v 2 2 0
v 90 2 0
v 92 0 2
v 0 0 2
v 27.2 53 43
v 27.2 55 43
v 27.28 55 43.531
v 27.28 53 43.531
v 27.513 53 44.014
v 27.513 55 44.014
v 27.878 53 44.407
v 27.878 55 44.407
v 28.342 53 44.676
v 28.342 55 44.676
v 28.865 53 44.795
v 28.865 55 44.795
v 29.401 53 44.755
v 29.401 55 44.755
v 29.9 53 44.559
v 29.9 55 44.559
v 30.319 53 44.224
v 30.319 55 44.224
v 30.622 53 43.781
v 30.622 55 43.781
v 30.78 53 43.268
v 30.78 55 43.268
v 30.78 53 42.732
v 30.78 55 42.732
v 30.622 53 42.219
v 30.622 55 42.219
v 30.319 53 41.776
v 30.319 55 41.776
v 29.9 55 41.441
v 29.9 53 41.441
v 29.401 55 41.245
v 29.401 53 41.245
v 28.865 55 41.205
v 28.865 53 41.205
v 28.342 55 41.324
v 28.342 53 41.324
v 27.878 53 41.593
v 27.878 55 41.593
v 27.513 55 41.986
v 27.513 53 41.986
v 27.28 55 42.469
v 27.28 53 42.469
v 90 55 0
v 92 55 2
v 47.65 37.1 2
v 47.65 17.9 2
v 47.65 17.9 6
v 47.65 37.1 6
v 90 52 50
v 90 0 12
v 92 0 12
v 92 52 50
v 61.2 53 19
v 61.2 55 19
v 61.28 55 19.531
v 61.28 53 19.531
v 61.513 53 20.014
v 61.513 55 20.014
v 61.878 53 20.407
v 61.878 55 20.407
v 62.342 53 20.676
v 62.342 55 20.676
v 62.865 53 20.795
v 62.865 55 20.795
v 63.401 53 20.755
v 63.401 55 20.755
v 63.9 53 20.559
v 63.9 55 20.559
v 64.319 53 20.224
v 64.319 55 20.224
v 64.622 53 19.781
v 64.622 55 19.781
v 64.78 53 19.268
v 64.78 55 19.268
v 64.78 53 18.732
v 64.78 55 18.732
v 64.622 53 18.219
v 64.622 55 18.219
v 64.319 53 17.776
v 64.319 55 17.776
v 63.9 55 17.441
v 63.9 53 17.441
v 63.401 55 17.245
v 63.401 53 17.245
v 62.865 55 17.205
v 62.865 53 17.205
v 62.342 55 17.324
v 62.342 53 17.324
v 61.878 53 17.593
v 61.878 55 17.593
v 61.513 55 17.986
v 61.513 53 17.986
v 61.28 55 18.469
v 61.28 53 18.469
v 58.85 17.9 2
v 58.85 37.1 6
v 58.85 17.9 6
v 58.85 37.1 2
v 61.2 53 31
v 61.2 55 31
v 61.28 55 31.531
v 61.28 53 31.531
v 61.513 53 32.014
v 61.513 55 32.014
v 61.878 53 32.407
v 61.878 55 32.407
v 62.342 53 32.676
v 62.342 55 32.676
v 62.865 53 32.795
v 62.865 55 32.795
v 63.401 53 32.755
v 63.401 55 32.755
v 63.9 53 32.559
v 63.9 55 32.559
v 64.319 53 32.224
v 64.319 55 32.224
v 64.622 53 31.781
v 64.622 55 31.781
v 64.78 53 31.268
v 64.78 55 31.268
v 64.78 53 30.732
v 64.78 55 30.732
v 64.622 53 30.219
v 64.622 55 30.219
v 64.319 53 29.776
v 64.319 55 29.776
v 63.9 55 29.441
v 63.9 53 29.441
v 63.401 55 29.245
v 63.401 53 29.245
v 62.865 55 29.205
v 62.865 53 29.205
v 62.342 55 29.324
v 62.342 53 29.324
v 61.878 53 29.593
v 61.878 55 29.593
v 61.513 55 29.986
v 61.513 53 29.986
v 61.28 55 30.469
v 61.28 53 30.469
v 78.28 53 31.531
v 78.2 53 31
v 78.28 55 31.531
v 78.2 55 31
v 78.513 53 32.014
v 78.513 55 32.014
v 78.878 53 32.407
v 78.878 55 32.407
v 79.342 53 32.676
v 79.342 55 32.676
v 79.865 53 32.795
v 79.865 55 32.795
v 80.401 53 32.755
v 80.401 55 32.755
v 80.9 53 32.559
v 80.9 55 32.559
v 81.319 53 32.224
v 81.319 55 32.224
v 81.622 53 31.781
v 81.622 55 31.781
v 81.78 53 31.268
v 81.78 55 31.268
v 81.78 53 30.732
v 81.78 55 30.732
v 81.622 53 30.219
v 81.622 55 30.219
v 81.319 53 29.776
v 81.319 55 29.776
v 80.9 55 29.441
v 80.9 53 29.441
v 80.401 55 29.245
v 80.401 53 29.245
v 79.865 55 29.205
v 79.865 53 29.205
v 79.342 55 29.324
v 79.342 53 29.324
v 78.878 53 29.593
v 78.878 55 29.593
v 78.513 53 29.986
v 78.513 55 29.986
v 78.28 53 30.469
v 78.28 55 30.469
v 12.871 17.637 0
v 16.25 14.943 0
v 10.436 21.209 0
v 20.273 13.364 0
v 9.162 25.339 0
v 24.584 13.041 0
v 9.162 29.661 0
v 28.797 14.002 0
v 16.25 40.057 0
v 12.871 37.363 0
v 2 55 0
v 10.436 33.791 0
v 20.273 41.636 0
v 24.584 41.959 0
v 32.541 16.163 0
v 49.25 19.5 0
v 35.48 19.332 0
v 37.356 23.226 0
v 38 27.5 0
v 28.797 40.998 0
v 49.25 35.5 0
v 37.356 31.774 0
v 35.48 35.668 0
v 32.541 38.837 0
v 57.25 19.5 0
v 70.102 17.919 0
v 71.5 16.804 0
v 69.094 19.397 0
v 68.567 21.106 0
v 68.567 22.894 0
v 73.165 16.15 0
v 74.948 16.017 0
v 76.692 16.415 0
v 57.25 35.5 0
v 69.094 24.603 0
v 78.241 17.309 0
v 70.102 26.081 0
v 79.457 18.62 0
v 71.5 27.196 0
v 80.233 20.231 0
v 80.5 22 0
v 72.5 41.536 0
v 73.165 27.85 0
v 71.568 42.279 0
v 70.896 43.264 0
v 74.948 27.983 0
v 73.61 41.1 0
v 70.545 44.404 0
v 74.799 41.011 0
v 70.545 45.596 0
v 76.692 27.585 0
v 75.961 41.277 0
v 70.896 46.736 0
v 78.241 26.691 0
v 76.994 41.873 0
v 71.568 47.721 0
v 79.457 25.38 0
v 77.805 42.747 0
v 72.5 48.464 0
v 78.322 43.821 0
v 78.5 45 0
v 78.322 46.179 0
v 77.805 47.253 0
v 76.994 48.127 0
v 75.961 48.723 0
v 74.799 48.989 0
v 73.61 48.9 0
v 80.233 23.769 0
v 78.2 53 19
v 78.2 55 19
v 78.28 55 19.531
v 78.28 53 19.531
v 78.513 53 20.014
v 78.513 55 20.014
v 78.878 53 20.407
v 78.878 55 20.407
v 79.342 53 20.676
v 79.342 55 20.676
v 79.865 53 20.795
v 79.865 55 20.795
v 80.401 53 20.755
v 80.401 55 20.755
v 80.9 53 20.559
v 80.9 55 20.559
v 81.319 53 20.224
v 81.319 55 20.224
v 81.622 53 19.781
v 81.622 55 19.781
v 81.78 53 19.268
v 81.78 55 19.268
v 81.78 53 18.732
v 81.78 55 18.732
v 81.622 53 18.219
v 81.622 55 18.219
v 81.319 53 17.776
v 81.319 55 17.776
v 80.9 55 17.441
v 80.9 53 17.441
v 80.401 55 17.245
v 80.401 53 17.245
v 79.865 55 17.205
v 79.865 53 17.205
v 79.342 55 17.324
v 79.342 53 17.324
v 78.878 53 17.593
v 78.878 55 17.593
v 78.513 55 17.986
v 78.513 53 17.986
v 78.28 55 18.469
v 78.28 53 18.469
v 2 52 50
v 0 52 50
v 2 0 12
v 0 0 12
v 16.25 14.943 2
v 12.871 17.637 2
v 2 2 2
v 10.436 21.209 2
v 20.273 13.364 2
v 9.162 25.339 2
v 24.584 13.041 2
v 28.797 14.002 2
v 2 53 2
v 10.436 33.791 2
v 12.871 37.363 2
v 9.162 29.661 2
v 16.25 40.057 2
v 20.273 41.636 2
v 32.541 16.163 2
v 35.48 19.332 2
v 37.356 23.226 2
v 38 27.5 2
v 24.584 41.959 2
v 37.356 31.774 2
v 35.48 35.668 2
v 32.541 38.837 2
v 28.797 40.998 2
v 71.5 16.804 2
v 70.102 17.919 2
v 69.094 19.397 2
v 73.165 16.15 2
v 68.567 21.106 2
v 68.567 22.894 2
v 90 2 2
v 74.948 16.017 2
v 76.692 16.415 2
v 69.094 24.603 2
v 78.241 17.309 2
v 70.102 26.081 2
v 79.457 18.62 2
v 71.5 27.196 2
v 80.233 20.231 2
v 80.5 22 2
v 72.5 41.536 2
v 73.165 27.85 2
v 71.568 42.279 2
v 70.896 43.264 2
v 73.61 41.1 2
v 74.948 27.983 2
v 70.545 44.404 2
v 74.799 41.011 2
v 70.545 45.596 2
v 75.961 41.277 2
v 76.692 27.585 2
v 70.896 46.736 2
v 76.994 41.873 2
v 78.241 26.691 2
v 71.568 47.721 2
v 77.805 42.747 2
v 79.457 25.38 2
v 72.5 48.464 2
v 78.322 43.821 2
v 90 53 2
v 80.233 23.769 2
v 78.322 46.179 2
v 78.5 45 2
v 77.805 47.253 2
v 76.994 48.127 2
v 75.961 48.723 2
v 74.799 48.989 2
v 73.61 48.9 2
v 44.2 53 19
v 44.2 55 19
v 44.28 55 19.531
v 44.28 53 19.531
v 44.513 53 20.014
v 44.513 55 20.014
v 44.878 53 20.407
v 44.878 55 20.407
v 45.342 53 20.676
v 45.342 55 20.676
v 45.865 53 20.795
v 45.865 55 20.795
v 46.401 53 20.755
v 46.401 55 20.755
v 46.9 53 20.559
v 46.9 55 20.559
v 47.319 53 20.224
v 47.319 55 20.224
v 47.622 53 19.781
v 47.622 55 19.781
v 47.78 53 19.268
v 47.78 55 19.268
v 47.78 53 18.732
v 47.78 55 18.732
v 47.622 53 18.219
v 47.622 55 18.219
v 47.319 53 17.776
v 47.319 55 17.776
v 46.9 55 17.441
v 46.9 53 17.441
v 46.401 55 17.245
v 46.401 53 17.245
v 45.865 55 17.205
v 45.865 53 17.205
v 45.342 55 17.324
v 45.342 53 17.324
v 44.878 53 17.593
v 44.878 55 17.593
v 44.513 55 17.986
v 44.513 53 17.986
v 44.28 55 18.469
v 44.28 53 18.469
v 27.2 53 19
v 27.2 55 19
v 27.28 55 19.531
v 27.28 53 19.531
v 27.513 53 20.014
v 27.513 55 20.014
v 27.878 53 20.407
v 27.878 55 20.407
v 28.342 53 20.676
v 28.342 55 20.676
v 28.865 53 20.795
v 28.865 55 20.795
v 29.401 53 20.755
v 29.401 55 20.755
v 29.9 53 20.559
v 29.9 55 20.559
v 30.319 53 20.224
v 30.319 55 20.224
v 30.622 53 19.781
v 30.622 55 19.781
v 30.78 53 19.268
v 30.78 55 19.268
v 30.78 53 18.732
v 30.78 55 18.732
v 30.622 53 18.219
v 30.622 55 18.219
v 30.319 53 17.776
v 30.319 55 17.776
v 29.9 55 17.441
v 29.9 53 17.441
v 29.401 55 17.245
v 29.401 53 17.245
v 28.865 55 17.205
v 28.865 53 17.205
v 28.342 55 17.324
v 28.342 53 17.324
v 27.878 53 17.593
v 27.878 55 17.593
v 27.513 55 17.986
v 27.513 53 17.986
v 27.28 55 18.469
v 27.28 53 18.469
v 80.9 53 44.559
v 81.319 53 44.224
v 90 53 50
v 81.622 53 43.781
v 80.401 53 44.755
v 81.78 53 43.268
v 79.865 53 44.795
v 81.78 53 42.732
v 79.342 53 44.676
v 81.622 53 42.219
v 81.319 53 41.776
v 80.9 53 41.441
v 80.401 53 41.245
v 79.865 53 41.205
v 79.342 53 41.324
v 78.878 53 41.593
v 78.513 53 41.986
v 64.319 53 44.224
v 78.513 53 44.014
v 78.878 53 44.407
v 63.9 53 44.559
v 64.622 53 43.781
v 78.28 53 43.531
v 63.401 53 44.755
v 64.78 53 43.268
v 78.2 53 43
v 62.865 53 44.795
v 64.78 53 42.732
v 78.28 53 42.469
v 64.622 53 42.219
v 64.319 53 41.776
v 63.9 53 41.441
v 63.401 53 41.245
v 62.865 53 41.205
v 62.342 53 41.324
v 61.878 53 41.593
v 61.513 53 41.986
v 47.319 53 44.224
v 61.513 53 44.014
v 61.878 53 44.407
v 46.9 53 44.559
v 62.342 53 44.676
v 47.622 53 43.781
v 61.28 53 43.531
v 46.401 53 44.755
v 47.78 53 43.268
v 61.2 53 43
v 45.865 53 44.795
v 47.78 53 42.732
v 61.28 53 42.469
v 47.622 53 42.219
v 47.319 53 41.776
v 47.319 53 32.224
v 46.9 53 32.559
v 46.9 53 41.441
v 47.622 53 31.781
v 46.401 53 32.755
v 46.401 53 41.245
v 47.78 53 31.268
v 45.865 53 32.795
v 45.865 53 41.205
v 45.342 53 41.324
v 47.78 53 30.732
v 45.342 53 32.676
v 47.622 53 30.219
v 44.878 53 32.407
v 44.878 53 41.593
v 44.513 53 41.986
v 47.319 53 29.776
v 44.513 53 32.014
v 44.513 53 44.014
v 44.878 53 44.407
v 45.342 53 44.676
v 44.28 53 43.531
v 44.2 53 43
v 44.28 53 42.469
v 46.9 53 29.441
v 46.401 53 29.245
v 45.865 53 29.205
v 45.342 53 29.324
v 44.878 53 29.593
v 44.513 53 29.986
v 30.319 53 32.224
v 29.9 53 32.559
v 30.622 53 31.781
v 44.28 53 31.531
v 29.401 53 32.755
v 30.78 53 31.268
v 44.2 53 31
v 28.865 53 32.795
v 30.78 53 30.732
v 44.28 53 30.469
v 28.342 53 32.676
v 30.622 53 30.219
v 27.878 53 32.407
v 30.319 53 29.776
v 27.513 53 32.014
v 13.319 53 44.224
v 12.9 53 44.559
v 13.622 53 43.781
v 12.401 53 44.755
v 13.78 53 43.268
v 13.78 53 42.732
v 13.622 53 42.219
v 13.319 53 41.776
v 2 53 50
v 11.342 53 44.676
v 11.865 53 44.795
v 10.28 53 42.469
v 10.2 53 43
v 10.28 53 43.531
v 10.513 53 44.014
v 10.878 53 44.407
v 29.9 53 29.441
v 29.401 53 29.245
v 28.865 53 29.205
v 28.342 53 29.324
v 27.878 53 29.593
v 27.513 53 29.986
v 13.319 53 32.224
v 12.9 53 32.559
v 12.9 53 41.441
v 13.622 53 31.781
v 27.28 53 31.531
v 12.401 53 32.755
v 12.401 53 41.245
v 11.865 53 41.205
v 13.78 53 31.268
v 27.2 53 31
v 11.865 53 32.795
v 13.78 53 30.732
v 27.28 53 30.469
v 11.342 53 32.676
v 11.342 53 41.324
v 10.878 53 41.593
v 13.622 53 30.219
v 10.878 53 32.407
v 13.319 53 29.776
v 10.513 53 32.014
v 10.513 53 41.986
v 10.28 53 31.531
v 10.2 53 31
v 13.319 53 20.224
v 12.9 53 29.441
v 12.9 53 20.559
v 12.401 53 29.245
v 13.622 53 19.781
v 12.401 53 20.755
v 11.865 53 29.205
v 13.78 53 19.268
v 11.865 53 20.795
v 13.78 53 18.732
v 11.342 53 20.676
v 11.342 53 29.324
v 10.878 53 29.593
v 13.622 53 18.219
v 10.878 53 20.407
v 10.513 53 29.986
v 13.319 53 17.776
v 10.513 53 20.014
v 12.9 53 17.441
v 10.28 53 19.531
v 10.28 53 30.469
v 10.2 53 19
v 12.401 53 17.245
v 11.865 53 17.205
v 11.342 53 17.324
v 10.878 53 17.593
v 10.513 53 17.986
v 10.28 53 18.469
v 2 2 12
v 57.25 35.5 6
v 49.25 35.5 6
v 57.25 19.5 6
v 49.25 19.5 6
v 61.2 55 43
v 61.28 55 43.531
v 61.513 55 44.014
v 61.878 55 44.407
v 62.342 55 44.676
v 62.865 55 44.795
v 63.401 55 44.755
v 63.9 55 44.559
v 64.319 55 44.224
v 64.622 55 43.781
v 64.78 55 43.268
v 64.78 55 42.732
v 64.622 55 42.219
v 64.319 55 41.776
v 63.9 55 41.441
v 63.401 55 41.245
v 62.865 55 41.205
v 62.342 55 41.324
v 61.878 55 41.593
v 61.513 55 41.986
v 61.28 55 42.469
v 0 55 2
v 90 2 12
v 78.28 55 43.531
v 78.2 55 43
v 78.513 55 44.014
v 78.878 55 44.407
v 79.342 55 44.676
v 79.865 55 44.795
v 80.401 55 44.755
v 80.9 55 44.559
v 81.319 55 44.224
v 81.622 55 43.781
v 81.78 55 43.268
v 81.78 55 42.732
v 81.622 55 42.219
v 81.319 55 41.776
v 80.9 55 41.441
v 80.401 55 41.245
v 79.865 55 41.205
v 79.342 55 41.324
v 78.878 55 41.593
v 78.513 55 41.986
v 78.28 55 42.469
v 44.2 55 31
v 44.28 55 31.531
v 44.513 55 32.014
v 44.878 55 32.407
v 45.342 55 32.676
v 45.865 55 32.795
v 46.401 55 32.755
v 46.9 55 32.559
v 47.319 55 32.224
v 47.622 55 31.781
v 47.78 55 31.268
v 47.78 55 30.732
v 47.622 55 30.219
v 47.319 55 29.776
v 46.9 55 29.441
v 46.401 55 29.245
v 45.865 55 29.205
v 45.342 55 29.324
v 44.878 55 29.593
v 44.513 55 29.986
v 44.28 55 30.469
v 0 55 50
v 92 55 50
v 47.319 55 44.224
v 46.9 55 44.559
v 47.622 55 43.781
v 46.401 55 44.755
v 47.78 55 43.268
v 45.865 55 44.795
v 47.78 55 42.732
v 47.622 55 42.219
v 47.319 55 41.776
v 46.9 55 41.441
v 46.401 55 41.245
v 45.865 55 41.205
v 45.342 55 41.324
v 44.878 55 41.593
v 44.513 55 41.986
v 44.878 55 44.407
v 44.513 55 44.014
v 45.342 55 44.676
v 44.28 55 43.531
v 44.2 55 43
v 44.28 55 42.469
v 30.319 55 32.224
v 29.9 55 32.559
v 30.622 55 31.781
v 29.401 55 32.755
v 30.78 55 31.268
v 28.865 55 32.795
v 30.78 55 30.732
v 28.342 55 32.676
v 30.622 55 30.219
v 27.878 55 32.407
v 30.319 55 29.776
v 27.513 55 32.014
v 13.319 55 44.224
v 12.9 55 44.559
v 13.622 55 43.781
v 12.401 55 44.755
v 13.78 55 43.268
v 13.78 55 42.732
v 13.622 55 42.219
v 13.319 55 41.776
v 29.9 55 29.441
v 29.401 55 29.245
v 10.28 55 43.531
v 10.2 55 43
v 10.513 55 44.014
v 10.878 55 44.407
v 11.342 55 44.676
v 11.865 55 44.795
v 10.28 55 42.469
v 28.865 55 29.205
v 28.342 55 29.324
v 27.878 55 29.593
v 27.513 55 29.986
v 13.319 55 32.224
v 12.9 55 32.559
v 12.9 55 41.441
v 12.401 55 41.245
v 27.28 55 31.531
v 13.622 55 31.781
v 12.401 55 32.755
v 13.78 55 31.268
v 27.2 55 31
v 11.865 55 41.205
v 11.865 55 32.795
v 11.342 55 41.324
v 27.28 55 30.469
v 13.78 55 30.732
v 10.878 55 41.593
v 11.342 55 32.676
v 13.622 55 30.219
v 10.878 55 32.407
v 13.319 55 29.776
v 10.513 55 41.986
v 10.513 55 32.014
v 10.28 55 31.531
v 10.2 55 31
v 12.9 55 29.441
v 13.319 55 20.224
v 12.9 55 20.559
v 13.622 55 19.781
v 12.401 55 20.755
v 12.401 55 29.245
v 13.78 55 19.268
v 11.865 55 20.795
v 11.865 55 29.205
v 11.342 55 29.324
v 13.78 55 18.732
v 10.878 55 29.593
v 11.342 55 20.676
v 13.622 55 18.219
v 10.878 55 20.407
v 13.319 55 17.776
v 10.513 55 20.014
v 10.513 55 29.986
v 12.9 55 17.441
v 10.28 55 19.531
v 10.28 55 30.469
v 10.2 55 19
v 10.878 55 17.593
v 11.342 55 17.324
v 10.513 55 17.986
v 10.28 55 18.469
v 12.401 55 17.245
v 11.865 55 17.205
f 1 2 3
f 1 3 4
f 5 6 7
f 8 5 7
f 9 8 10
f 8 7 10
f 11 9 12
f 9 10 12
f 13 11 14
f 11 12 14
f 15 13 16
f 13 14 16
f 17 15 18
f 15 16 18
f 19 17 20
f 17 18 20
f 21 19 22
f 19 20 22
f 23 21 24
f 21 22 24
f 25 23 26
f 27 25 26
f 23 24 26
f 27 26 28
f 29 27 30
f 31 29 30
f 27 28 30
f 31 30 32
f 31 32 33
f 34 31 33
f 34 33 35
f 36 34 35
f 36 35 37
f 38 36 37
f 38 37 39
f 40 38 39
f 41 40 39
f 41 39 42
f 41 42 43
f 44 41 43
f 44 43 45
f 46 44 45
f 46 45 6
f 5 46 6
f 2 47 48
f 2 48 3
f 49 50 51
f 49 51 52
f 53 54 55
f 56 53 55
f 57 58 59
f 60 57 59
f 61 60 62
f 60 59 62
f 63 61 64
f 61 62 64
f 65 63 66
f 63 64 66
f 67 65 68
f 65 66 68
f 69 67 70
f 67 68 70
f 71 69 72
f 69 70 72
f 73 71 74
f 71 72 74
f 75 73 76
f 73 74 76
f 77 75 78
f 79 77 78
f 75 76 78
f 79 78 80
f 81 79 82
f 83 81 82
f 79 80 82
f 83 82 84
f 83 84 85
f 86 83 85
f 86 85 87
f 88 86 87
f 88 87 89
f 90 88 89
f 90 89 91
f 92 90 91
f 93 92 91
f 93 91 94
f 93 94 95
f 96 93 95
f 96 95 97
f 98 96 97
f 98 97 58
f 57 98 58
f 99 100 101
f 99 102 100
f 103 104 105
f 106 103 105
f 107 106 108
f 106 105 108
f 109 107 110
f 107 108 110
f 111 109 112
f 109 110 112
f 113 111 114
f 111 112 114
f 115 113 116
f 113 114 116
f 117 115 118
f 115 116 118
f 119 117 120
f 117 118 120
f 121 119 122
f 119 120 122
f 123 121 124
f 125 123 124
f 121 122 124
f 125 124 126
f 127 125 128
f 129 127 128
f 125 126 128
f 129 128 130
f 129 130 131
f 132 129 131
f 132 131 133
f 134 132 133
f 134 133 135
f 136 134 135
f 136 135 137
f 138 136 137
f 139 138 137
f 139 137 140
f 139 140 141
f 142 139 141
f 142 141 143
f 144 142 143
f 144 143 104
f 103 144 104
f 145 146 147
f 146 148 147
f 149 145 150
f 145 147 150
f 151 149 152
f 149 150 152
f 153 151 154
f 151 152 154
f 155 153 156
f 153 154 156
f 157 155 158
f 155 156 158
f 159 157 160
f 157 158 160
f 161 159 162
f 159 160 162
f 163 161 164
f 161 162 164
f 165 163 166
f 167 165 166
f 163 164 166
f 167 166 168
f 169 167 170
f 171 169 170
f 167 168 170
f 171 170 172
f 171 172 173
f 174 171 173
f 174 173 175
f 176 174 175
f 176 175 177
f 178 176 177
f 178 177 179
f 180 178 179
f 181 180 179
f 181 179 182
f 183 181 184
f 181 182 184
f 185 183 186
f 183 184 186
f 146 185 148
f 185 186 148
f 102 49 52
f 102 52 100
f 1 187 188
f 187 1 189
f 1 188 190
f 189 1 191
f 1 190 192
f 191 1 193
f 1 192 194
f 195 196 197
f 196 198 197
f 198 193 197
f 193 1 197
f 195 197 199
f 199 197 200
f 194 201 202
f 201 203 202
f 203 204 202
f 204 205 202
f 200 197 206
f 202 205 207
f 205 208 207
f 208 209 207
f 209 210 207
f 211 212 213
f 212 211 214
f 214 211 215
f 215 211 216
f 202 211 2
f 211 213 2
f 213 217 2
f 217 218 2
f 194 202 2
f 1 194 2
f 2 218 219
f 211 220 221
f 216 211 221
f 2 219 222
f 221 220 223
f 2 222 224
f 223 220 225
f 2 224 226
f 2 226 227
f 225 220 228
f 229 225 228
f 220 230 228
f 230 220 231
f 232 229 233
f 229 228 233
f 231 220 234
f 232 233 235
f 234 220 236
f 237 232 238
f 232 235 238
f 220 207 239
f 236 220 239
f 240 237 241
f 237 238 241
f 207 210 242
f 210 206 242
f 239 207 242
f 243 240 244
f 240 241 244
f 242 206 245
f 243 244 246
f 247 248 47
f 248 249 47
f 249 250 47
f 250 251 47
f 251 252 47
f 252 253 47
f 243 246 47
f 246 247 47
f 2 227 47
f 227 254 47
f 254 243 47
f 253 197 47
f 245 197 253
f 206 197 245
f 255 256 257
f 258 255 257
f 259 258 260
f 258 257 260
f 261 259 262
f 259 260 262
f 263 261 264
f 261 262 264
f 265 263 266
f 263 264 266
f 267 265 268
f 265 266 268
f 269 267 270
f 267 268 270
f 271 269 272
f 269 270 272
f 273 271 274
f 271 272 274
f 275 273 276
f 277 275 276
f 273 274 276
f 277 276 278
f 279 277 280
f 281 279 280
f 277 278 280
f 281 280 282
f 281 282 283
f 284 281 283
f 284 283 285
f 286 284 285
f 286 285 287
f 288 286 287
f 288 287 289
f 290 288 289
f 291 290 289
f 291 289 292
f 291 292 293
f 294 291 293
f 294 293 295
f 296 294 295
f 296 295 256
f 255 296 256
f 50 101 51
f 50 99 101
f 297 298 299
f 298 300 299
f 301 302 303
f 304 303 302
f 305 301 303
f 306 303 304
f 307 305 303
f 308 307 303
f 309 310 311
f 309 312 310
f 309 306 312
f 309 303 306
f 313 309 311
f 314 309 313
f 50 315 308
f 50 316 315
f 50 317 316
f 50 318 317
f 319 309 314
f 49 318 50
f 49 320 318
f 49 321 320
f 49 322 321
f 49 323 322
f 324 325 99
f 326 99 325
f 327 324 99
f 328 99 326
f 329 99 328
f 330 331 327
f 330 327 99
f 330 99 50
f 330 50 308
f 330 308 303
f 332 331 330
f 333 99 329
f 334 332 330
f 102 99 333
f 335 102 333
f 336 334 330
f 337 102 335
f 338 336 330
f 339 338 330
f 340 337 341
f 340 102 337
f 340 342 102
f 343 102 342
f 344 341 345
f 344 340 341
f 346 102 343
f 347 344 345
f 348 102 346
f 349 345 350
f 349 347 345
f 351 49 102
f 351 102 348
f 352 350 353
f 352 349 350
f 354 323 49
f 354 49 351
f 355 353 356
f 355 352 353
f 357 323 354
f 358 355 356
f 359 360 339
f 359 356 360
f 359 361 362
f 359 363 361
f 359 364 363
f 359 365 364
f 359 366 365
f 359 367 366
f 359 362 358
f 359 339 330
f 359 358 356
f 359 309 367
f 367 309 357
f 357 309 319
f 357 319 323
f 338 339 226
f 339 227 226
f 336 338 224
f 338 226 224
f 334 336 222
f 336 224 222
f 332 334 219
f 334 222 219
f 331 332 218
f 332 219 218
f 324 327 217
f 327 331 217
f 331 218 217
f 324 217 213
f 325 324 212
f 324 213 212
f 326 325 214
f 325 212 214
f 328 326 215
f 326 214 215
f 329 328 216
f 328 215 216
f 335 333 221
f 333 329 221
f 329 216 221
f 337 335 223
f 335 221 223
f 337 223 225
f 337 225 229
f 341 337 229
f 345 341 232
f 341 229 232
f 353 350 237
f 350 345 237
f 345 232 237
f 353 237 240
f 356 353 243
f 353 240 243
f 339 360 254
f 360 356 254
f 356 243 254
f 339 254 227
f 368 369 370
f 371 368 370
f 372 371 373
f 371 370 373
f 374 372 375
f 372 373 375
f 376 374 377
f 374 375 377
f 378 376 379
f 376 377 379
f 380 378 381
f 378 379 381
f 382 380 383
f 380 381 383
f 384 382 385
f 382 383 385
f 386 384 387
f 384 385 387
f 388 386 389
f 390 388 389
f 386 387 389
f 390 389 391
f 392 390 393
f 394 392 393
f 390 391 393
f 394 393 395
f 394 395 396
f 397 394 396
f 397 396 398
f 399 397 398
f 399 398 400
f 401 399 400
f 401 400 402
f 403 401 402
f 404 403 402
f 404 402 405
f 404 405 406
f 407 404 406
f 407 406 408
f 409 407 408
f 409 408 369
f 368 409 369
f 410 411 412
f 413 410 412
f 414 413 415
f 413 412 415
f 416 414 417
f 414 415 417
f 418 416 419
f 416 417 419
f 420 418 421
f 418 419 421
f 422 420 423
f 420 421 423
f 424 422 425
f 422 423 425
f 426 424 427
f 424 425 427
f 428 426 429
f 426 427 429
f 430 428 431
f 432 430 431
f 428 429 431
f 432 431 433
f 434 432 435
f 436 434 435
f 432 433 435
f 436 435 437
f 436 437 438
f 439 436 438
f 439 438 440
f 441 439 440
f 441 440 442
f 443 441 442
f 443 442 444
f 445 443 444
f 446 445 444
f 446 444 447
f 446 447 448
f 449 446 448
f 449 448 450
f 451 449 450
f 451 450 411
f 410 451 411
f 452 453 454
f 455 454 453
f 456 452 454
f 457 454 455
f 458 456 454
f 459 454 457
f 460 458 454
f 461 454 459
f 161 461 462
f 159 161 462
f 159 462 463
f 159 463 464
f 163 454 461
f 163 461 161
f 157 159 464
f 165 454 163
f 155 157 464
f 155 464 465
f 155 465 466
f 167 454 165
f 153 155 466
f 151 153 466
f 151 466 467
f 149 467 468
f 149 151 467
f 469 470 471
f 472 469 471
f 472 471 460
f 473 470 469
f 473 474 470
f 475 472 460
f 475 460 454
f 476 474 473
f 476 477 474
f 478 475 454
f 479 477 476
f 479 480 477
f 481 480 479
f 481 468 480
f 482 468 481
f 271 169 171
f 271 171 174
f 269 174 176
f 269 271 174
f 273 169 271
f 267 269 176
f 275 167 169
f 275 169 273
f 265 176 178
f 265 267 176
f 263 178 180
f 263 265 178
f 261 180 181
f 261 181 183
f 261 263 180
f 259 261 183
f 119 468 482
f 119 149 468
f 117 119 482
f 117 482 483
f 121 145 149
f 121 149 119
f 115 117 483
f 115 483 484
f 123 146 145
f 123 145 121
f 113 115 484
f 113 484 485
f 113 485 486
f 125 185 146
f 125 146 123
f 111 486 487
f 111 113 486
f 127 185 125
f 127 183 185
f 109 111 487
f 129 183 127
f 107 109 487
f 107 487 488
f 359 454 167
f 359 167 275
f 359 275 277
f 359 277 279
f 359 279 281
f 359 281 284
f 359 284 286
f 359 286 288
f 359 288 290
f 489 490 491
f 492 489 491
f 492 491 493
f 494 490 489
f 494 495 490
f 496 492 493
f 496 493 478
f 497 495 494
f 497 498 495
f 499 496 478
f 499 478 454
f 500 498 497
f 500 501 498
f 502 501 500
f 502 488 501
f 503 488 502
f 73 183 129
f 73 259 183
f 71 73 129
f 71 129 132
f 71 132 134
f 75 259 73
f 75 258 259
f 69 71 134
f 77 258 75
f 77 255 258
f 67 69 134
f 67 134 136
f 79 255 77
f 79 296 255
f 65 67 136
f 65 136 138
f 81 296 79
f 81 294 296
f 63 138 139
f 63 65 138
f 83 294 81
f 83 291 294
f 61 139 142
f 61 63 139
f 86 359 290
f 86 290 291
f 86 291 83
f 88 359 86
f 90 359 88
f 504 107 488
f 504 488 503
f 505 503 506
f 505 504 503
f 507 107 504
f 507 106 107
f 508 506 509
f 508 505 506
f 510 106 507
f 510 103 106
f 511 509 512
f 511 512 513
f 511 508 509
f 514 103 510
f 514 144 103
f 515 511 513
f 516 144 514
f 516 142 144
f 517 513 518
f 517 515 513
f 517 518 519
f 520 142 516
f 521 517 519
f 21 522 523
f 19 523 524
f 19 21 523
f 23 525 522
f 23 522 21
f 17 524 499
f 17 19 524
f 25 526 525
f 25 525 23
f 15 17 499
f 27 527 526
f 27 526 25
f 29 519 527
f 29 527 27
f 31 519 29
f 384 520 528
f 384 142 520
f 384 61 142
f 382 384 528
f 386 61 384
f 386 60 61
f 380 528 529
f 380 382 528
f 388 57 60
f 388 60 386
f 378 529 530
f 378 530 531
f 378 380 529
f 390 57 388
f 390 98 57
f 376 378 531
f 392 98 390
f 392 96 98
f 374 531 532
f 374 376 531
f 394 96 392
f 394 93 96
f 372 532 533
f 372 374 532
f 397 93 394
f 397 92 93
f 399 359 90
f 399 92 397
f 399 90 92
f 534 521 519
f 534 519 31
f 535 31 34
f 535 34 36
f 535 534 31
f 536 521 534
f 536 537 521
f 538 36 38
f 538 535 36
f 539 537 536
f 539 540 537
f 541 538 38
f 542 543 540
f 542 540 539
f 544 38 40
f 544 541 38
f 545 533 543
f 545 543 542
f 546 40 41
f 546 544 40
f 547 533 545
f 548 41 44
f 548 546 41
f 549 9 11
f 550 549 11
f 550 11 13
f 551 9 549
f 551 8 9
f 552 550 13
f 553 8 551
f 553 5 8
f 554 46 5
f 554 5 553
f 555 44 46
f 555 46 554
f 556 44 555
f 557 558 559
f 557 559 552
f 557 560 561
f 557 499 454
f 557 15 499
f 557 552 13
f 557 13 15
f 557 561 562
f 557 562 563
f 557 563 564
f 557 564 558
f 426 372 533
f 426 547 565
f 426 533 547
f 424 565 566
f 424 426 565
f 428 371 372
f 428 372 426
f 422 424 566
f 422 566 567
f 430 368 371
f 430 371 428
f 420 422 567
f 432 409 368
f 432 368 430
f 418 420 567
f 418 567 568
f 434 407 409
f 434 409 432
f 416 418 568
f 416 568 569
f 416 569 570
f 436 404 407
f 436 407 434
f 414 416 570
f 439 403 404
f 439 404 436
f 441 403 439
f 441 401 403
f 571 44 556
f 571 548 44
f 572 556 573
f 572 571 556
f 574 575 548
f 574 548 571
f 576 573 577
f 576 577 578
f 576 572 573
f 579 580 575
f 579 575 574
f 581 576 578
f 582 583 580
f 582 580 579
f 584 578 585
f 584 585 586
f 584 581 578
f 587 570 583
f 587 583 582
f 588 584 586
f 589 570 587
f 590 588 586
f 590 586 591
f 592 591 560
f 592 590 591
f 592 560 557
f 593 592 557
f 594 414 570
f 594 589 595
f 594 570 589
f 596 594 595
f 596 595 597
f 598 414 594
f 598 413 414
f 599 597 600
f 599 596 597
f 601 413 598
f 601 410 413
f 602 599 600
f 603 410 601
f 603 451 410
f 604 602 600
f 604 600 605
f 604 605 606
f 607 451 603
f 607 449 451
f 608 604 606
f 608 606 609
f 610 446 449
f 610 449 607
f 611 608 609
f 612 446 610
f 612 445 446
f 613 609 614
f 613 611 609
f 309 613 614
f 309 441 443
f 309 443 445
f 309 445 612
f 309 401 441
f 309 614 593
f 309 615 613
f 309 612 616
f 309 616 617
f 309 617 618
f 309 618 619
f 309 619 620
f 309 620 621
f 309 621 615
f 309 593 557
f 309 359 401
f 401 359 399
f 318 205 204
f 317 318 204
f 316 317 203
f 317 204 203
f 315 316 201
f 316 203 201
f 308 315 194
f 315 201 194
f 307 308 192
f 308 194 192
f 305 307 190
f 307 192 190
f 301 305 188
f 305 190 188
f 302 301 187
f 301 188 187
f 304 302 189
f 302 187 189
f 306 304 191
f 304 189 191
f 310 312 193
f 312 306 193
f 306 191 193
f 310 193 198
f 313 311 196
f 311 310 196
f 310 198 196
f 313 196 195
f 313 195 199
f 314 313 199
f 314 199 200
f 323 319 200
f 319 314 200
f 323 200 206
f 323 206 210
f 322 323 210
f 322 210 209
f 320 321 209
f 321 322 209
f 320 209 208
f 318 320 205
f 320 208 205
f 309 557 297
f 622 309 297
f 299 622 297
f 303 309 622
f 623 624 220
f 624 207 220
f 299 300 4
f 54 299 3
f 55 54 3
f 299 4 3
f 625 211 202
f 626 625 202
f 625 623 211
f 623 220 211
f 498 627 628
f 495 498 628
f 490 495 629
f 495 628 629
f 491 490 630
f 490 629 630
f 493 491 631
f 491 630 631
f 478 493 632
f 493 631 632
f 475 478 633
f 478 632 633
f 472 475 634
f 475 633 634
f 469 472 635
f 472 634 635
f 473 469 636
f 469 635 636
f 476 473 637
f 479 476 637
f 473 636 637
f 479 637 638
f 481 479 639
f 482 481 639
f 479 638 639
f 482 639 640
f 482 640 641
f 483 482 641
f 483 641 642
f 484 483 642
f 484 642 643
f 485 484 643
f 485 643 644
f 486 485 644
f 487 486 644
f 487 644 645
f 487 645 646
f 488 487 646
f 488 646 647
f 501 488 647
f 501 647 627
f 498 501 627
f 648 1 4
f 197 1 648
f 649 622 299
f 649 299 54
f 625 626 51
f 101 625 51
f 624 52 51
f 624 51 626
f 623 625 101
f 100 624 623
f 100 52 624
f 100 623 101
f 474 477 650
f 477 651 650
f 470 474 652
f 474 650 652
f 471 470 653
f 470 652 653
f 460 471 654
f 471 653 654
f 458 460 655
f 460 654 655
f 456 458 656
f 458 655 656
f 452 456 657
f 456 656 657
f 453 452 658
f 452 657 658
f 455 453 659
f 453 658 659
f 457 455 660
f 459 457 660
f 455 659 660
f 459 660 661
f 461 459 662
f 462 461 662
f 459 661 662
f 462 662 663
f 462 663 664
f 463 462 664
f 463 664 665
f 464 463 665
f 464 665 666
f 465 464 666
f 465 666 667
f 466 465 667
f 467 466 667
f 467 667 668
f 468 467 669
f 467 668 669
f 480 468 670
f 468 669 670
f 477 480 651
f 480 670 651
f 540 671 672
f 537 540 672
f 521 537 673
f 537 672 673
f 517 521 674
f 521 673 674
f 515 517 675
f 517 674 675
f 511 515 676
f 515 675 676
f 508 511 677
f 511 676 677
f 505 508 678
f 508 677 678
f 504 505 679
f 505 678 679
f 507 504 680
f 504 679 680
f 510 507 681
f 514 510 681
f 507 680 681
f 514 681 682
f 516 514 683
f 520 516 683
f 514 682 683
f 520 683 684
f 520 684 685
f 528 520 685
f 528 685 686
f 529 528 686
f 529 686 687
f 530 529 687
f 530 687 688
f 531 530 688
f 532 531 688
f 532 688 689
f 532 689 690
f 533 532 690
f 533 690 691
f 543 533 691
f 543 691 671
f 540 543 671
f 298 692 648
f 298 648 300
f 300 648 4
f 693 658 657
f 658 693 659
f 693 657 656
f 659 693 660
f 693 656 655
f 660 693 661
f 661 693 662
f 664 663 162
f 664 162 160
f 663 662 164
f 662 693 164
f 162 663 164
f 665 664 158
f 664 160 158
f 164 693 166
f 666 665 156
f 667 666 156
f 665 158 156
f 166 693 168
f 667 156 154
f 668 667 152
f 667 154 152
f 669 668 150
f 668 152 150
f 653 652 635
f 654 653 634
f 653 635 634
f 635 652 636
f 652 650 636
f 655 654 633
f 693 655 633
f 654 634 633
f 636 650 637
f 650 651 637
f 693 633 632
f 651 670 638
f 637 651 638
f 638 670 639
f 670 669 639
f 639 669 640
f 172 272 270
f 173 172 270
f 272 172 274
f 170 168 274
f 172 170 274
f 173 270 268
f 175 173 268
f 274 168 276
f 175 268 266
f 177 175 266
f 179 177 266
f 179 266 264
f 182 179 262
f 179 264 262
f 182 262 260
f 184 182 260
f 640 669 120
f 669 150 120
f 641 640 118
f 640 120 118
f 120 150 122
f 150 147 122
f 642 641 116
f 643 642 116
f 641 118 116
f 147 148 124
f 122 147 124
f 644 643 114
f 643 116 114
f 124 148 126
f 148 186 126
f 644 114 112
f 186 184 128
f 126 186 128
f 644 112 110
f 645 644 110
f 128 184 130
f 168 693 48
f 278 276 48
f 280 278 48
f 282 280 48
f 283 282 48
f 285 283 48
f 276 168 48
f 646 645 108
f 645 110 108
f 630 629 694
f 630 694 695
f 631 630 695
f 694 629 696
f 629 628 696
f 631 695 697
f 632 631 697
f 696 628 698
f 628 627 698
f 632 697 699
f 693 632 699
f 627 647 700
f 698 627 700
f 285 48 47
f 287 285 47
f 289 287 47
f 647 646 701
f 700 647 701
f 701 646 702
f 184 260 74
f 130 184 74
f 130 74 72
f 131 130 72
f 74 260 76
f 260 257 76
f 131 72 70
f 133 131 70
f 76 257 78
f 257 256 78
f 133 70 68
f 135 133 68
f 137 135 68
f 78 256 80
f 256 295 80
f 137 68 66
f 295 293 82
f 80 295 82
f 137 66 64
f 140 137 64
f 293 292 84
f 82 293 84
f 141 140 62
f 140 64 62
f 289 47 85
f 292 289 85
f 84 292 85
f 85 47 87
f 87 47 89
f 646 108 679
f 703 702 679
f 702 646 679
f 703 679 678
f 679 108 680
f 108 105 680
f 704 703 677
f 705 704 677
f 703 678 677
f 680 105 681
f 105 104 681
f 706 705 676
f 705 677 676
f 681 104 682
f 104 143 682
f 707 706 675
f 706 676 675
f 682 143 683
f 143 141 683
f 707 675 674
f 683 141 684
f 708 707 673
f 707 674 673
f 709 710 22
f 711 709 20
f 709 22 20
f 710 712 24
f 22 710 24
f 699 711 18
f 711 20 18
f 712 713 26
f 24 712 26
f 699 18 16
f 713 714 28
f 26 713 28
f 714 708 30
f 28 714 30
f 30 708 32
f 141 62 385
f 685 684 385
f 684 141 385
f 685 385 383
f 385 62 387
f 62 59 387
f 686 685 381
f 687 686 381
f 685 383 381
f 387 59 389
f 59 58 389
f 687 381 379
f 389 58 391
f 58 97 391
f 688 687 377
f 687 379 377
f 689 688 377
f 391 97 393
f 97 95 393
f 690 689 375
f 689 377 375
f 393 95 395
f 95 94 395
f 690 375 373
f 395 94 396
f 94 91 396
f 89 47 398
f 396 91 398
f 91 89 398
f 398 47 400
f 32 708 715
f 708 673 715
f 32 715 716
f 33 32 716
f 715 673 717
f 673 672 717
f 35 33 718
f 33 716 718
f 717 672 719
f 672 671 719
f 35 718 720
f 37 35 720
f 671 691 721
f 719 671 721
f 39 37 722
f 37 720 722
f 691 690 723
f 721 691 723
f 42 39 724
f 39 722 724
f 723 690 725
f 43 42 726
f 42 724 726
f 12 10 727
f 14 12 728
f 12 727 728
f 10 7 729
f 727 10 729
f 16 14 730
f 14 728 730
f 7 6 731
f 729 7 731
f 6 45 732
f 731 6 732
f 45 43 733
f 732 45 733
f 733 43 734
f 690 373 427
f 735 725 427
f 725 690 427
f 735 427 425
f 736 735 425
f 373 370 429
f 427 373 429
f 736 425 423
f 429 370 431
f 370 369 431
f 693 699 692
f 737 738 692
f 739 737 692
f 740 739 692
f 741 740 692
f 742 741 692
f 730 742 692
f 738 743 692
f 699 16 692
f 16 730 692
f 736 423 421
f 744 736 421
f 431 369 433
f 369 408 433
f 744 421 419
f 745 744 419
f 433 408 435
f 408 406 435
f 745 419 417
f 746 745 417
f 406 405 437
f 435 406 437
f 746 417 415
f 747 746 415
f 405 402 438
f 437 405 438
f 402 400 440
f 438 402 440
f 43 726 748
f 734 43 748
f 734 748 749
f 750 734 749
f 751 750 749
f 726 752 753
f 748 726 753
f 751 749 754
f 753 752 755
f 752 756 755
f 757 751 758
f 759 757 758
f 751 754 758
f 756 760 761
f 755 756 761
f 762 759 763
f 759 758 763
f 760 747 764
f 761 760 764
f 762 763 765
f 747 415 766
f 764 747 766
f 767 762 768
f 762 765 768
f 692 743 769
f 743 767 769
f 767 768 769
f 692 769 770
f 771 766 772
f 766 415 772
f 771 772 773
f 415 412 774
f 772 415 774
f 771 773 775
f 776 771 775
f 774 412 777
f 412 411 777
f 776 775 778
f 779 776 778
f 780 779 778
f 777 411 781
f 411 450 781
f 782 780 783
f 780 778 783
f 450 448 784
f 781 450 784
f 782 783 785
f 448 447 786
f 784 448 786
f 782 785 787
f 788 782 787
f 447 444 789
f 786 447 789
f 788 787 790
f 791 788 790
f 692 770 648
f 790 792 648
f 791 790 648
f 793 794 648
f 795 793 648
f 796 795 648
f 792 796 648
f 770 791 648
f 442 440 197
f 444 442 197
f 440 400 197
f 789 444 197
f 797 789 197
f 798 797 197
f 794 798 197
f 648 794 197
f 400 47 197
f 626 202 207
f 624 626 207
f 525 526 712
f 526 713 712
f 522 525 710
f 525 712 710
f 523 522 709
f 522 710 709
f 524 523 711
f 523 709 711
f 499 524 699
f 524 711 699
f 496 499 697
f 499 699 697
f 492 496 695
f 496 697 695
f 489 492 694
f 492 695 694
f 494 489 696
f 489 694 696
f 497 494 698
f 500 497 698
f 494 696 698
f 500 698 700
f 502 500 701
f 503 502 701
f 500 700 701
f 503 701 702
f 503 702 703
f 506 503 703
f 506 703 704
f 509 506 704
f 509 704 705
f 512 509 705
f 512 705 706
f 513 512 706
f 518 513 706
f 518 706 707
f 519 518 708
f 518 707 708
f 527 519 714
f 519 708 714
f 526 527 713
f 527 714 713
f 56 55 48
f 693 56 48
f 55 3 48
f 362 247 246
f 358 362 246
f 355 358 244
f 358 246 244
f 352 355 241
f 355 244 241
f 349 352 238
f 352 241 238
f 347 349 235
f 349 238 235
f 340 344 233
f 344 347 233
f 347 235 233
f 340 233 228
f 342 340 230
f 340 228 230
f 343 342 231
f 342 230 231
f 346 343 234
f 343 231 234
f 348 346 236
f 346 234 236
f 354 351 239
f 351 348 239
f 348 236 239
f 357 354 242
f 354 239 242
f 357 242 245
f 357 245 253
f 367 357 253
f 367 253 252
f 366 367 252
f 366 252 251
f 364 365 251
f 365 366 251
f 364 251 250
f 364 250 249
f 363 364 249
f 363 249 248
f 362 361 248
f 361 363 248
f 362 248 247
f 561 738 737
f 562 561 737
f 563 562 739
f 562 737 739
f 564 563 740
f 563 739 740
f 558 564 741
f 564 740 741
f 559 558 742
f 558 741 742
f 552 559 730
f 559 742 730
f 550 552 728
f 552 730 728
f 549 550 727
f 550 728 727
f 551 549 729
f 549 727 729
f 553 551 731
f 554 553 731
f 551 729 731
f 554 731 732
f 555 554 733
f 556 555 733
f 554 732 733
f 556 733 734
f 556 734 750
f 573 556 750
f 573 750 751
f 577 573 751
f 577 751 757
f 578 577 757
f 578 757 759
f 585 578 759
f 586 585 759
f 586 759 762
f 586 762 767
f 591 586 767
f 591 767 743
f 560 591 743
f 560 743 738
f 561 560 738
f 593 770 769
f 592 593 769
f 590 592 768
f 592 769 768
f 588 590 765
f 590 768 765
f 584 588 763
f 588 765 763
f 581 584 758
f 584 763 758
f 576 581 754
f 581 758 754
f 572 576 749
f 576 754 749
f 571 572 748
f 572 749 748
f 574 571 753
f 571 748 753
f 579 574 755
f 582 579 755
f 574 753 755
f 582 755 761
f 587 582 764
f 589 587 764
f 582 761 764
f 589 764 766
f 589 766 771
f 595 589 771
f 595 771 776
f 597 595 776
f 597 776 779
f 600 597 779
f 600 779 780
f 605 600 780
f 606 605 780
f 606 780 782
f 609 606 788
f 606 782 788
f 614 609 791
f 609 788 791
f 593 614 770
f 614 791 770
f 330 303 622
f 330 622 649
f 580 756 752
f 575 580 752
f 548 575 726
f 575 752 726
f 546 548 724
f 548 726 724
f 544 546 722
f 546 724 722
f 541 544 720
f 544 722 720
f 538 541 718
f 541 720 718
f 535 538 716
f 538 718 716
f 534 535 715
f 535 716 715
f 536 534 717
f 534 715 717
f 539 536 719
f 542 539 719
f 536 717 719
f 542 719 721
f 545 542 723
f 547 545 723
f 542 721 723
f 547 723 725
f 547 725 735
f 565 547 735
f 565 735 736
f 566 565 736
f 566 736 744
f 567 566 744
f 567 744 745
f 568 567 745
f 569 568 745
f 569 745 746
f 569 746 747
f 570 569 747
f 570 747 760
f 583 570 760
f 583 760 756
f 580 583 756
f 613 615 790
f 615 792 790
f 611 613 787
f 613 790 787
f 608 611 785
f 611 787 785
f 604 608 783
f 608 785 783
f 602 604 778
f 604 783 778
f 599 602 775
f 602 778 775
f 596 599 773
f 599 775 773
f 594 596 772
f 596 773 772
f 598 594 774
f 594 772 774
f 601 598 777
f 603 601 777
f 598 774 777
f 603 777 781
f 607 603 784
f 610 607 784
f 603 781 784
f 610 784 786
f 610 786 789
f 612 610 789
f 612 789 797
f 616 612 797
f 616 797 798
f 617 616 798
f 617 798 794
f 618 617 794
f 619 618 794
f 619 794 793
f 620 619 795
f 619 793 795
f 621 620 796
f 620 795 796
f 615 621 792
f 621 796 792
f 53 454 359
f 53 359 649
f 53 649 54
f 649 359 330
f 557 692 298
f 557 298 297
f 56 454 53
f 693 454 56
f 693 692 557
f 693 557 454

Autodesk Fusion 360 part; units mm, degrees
sketch "Skizze1" plane through (0, 0, 0) normal (0, 0, 1) x (1, 0, 0) in component "Montagewinkel"
  line L0 (0, 0) -> (92, 0)
  line L1 (92, 0) -> (92, 55)
  line L2 (92, 55) -> (0, 55)
  line L3 (0, 55) -> (0, 0)
  line L4 (2, 2) -> (90, 2)
  line L5 (90, 2) -> (90, 53)
  line L6 (90, 53) -> (2, 53)
  line L7 (2, 53) -> (2, 2)
  line L8 (2, 53) -> (2, 55)
  line L9 (90, 53) -> (90, 55)
  line L10 (2, 2) -> (2, 0)
  line L11 (90, 2) -> (90, 0)
  circle A0 centre (23.5, 27.5) radius 14.5
  circle A1 centre (74.5, 22) radius 6
  circle A2 centre (74.5, 45) radius 4
  line L12 (38, 47) -> (38, 7) construction
  line L13 (68.5, 47) -> (68.5, 7) construction
  line L14 (68.5, 27.5) -> (38, 27.5) construction
  line L15 (57.25, 19.5) -> (49.25, 19.5)
  line L16 (49.25, 19.5) -> (49.25, 35.5)
  line L17 (49.25, 35.5) -> (57.25, 35.5)
  line L18 (57.25, 35.5) -> (57.25, 19.5)
  line L19 (57.25, 19.5) -> (49.25, 35.5) construction
  line L20 (49.25, 19.5) -> (57.25, 35.5) construction
  line L21 (58.85, 17.9) -> (47.65, 17.9)
  line L22 (47.65, 17.9) -> (47.65, 37.1)
  line L23 (47.65, 37.1) -> (58.85, 37.1)
  line L24 (58.85, 37.1) -> (58.85, 17.9)
  point P0 (53.25, 27.5)
  dimension "d1" = 92
  dimension "d2" = 55
  dimension "d3" = -2
  dimension "d4" = 29
  dimension "d5" = 23.5
  dimension "d6" = 27.5
  dimension "d7" = 12
  dimension "d8" = 22
  dimension "d9" = 17.5
  dimension "d10" = 8
  dimension "d11" = 10
  dimension "d12" = 17.5
  dimension "d13" = 27.5
  dimension "d14" = 8
  dimension "d15" = 16
  dimension "d16" = -1.6
extrude "Extrusion1" add sketch "Skizze1" along normal blind 2 contours L4 L5 L6 L7 in component "Montagewinkel"
extrude "Extrusion3" add sketch "Skizze1" along normal blind 6 contours L21 L22 L23 L24 in component "Montagewinkel"
extrude "Extrusion4" add sketch "Skizze1" along normal blind 50 contours L0 L2 L3 L7 L8 L10 | L0 L1 L2 L5 L9 L11 | L2 L6 L8 L9 in component "Montagewinkel"
extrude "Extrusion5" add sketch "Skizze1" along normal blind 12 contours L0 L4 L10 L11 in component "Montagewinkel"
chamfer "Fase1" distance 52 distance2 38 2 edges at (1, 0, 50) (91, 0, 50) measured on face at (31.3333, 54.3333, 50) measured on face at (31.3333, 54.3333, 50) in component "Montagewinkel"
chamfer "Fase2" distance 2 angle 45 3 edges at (46, 0, 0) (0, 27.5, 0) (92, 27.5, 0) in component "Montagewinkel"
sketch "Skizze2" plane through (0, 55, 0) normal (0, 1, 0) x (-1, 0, 0) in component "Montagewinkel"
  line L0 (-92, 2) -> (-90, 0)
  line L1 (-90, 0) -> (-2, 0)
  line L2 (-2, 0) -> (0, 2)
  line L3 (0, 2) -> (0, 50)
  line L4 (0, 50) -> (-92, 50)
  line L5 (-92, 50) -> (-92, 2)
  line L6 (0, 12) -> (-2, 12)
  line L7 (-2, 12) -> (-90, 12)
  line L8 (-90, 12) -> (-92, 12)
  line L9 (-2, 2) -> (-2, 50)
  line L10 (-90, 2) -> (-90, 50)
  circle A0 centre (-80, 19) radius 1.8
  circle A1 centre (-63, 19) radius 1.8
  circle A2 centre (-80, 31) radius 1.8
  circle A3 centre (-63, 31) radius 1.8
  circle A4 centre (-46, 19) radius 1.8
  circle A5 centre (-29, 19) radius 1.8
  circle A6 centre (-12, 19) radius 1.8
  circle A7 centre (-46, 31) radius 1.8
  circle A8 centre (-29, 31) radius 1.8
  circle A9 centre (-12, 31) radius 1.8
  circle A10 centre (-80, 43) radius 1.8
  circle A11 centre (-63, 43) radius 1.8
  circle A12 centre (-46, 43) radius 1.8
  circle A13 centre (-29, 43) radius 1.8
  circle A14 centre (-12, 43) radius 1.8
  dimension "d30" = 3.6
  dimension "d31" = 10
  dimension "d32" = 7
  dimension "d36" = 68
  dimension "d37" = 24
extrude "Extrusion6" cut sketch "Skizze2" against normal blind 2 contours A0 | A1 | A2 | A3 | A4 | A5 | A6 | A7 | A8 | A9 | A10 | A11 | A12 | A13 | A14 in component "Montagewinkel"
component "Montagewinkel" placed x (1, 0, 0) y (0, 1, 0) z (0, 0, 1) at (0, 0, 0)
equation "d5 = ( 37 / 2 ) * 1 mm + 5 mm"
equation "d6 = ( 55 / 2 ) * 1 mm"
equation "d8 = 5 mm + ( 34 / 2 ) * 1 mm"
equation "d9 = 5 mm + ( 25 / 2 ) * 1 mm"
equation "d11 = 5 mm + 5 mm"
equation "d13 = ( 55 / 2 ) * 1 mm"
